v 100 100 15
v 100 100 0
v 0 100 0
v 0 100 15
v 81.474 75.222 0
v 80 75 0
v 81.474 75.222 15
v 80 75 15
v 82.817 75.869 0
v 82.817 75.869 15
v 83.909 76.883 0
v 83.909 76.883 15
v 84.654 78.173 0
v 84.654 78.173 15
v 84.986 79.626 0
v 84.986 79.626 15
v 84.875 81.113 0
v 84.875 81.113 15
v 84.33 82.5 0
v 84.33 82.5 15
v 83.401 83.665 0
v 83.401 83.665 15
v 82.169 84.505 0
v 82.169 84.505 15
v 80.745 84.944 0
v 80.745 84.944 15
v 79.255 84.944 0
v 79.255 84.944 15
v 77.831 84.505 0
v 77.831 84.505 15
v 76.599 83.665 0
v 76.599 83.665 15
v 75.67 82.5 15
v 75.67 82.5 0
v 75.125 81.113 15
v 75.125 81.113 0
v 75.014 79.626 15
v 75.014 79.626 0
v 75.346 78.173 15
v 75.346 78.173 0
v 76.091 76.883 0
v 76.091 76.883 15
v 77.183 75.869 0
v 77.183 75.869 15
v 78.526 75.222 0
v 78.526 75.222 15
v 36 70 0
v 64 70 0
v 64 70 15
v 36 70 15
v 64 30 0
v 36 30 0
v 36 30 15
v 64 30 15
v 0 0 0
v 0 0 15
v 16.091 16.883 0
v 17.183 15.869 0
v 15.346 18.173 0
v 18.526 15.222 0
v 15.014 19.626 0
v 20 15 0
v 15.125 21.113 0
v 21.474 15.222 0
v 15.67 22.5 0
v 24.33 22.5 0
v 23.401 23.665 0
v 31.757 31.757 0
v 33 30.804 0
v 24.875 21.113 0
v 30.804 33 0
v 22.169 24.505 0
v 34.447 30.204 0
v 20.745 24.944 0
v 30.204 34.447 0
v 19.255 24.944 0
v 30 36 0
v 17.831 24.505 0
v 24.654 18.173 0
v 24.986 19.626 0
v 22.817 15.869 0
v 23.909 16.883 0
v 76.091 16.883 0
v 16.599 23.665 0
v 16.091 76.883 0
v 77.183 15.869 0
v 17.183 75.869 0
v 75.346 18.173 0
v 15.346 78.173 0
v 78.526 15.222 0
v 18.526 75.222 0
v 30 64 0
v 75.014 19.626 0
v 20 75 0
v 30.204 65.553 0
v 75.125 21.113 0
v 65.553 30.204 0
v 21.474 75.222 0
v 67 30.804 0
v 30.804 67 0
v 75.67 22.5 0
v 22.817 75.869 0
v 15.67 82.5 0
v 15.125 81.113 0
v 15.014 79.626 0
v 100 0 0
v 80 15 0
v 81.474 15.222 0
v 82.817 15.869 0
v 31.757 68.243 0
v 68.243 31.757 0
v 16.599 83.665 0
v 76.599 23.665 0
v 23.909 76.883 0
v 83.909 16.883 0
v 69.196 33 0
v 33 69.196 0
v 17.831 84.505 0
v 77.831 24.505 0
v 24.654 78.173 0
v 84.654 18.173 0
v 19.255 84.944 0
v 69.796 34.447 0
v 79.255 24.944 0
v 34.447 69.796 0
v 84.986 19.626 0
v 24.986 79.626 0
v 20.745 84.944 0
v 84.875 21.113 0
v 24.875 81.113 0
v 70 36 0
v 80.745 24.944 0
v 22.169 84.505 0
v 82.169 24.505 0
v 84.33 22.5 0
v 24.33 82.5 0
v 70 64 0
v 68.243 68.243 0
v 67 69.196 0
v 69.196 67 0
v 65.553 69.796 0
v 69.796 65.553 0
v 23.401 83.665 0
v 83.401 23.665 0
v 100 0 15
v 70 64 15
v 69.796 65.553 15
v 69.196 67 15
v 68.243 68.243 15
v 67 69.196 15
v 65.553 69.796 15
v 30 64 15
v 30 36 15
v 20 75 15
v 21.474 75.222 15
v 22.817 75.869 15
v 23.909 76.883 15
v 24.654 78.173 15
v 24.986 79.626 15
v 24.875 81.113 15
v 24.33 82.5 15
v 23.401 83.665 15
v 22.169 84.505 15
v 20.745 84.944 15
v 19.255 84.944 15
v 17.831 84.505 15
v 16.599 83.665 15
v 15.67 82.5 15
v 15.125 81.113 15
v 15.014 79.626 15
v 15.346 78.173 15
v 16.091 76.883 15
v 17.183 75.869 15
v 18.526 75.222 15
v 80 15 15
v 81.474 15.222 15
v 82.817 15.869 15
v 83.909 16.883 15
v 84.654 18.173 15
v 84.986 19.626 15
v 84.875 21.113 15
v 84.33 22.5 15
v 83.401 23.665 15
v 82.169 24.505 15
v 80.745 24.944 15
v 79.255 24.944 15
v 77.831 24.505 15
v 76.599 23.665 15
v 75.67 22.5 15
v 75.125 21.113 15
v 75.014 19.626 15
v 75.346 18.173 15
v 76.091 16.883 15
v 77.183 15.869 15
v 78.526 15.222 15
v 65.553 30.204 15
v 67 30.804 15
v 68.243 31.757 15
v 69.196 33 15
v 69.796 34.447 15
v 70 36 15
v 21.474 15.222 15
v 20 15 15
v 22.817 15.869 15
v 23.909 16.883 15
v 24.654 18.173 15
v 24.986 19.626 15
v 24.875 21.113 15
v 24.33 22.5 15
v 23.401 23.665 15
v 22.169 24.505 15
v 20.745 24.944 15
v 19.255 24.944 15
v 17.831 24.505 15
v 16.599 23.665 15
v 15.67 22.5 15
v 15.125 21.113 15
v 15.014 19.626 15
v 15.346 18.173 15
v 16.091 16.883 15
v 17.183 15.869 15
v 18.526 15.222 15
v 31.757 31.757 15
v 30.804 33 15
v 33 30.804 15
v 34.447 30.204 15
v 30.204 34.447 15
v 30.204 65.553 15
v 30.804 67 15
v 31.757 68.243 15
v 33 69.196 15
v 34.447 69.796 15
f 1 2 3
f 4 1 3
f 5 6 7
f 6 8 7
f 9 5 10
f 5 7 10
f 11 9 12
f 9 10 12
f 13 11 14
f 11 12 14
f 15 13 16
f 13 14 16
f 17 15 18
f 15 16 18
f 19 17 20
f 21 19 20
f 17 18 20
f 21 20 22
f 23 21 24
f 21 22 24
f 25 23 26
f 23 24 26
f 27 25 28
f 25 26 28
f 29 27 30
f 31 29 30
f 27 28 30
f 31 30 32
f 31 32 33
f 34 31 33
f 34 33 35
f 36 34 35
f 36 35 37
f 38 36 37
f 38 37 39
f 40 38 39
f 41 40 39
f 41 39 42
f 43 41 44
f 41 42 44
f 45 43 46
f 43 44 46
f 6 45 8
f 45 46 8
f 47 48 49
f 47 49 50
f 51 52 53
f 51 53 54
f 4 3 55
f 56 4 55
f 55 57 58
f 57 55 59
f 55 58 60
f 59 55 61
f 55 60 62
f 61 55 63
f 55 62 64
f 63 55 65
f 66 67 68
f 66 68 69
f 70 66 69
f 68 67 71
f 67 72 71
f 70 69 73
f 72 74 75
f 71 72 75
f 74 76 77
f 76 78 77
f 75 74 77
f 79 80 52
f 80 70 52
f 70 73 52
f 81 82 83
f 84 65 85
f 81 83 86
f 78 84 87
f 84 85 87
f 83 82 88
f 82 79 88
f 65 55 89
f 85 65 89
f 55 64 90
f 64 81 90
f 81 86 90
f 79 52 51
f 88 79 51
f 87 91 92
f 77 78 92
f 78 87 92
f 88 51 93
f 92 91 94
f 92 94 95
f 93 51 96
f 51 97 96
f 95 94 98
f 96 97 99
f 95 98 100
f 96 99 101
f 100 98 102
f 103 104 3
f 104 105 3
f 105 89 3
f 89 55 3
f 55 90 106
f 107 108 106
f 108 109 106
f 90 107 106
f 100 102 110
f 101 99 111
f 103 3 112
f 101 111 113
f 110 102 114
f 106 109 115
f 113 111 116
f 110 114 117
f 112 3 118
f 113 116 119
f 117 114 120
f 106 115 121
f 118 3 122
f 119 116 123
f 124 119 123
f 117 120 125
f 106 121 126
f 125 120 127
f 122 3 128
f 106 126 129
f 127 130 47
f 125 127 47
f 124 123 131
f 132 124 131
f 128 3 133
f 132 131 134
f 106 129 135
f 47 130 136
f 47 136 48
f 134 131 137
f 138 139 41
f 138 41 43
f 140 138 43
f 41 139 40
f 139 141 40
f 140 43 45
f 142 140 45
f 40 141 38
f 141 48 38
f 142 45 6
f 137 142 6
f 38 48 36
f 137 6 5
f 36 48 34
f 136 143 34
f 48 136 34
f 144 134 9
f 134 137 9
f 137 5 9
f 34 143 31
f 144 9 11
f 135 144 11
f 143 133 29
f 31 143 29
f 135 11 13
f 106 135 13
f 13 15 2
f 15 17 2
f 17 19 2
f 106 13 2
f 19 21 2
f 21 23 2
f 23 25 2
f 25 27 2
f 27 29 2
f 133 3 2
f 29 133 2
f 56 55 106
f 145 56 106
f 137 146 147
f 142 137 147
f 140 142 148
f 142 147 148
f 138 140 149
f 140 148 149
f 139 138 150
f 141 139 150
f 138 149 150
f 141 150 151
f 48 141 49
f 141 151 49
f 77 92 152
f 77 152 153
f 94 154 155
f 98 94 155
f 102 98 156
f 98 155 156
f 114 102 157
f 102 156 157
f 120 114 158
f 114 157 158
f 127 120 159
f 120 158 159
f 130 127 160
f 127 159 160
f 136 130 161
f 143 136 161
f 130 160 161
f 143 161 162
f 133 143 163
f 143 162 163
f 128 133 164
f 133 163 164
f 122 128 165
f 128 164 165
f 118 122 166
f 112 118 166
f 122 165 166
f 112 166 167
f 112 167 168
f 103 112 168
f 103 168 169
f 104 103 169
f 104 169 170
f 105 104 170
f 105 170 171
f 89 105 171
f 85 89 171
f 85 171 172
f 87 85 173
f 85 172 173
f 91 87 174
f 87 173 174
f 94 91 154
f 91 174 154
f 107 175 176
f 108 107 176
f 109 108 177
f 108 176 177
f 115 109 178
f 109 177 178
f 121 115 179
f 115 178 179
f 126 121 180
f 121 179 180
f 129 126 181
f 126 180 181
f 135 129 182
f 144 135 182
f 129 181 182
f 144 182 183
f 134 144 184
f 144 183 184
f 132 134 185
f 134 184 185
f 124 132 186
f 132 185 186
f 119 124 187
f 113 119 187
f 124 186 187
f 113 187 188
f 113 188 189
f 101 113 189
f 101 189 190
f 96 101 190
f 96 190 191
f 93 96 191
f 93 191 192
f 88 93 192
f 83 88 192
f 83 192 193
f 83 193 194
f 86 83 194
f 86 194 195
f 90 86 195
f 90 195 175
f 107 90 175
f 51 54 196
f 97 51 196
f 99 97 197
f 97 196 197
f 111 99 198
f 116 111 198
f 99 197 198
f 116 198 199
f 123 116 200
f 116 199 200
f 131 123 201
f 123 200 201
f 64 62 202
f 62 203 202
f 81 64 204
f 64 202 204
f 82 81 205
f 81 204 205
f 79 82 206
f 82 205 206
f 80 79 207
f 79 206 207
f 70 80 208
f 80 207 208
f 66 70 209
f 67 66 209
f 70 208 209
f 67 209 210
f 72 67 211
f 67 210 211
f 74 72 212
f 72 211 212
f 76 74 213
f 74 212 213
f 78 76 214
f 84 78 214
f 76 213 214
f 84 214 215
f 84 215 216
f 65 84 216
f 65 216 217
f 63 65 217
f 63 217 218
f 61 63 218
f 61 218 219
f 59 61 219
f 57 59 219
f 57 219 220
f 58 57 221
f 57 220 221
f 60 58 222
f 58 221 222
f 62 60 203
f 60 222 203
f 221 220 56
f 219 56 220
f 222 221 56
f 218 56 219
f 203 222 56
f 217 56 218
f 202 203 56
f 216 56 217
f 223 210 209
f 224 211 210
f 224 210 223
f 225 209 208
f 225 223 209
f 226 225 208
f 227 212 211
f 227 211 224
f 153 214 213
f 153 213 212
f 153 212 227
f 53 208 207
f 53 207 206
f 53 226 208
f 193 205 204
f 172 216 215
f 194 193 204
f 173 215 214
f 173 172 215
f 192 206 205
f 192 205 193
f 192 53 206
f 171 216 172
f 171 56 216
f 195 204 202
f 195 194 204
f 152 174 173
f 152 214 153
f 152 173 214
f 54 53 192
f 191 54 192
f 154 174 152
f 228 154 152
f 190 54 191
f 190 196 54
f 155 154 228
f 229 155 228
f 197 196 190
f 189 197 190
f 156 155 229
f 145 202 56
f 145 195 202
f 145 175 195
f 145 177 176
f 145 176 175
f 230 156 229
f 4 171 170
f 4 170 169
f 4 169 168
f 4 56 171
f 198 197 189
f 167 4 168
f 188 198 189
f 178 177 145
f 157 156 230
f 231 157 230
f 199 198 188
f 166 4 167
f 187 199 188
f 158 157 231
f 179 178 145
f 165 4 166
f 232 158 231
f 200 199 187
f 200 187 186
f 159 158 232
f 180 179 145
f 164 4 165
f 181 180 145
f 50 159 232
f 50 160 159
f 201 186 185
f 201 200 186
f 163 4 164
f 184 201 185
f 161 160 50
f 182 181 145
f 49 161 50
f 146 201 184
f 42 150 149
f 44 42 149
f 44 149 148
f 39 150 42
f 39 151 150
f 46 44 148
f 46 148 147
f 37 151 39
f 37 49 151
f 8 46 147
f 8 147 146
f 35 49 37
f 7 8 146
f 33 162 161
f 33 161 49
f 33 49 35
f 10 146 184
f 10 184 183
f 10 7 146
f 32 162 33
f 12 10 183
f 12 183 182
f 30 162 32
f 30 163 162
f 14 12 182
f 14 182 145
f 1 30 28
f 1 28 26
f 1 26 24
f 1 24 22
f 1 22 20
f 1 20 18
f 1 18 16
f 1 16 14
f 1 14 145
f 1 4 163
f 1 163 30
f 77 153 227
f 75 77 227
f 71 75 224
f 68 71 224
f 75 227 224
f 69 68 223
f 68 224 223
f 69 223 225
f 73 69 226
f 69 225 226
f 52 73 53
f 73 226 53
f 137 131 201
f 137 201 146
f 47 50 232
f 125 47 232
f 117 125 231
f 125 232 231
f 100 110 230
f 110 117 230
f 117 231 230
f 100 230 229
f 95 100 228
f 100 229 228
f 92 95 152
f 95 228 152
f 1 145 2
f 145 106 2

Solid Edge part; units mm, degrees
sketch "Sketch1" plane through (0, 0, 0) normal (0, 0, 1) x (1, 0, 0)
  line L0 (0, 0) -> (100, 0)
  line L1 (100, 0) -> (100, 100)
  line L2 (100, 100) -> (0, 100)
  line L3 (0, 100) -> (0, 0)
extrude "Protrusion1" add sketch "Sketch1" along normal blind 15
hole "Hole_1" at (80, 80, 15) direction (0, 0, -1) diameter 10 end through all
hole "Hole1" at (80, 20, 15) direction (0, 0, -1) diameter 10 end through all
hole "Hole2" at (20, 20, 15) direction (0, 0, -1) diameter 10 end through all
hole "Hole3" at (20, 80, 15) direction (0, 0, -1) diameter 10 end through all
sketch "Sketch2" plane through (50, 50, 0) normal (0, 0, -1) x (0, -1, 0)
  line L0 (-20, 20) -> (20, 20)
  line L1 (20, 20) -> (20, -20)
  line L2 (20, -20) -> (-20, -20)
  line L3 (-20, -20) -> (-20, 20)
  dimension "D1" = 30
  dimension "D2" = 30
  dimension "D3" = 30
  dimension "D4" = 30
extrude "Cutout1" cut sketch "Sketch2" against normal through all
fillet "Round_2" radius 6 4 edges at (30, 70, 7.5) (70, 70, 7.5) (70, 30, 7.5) (30, 30, 7.5)
properties part number "1000"
